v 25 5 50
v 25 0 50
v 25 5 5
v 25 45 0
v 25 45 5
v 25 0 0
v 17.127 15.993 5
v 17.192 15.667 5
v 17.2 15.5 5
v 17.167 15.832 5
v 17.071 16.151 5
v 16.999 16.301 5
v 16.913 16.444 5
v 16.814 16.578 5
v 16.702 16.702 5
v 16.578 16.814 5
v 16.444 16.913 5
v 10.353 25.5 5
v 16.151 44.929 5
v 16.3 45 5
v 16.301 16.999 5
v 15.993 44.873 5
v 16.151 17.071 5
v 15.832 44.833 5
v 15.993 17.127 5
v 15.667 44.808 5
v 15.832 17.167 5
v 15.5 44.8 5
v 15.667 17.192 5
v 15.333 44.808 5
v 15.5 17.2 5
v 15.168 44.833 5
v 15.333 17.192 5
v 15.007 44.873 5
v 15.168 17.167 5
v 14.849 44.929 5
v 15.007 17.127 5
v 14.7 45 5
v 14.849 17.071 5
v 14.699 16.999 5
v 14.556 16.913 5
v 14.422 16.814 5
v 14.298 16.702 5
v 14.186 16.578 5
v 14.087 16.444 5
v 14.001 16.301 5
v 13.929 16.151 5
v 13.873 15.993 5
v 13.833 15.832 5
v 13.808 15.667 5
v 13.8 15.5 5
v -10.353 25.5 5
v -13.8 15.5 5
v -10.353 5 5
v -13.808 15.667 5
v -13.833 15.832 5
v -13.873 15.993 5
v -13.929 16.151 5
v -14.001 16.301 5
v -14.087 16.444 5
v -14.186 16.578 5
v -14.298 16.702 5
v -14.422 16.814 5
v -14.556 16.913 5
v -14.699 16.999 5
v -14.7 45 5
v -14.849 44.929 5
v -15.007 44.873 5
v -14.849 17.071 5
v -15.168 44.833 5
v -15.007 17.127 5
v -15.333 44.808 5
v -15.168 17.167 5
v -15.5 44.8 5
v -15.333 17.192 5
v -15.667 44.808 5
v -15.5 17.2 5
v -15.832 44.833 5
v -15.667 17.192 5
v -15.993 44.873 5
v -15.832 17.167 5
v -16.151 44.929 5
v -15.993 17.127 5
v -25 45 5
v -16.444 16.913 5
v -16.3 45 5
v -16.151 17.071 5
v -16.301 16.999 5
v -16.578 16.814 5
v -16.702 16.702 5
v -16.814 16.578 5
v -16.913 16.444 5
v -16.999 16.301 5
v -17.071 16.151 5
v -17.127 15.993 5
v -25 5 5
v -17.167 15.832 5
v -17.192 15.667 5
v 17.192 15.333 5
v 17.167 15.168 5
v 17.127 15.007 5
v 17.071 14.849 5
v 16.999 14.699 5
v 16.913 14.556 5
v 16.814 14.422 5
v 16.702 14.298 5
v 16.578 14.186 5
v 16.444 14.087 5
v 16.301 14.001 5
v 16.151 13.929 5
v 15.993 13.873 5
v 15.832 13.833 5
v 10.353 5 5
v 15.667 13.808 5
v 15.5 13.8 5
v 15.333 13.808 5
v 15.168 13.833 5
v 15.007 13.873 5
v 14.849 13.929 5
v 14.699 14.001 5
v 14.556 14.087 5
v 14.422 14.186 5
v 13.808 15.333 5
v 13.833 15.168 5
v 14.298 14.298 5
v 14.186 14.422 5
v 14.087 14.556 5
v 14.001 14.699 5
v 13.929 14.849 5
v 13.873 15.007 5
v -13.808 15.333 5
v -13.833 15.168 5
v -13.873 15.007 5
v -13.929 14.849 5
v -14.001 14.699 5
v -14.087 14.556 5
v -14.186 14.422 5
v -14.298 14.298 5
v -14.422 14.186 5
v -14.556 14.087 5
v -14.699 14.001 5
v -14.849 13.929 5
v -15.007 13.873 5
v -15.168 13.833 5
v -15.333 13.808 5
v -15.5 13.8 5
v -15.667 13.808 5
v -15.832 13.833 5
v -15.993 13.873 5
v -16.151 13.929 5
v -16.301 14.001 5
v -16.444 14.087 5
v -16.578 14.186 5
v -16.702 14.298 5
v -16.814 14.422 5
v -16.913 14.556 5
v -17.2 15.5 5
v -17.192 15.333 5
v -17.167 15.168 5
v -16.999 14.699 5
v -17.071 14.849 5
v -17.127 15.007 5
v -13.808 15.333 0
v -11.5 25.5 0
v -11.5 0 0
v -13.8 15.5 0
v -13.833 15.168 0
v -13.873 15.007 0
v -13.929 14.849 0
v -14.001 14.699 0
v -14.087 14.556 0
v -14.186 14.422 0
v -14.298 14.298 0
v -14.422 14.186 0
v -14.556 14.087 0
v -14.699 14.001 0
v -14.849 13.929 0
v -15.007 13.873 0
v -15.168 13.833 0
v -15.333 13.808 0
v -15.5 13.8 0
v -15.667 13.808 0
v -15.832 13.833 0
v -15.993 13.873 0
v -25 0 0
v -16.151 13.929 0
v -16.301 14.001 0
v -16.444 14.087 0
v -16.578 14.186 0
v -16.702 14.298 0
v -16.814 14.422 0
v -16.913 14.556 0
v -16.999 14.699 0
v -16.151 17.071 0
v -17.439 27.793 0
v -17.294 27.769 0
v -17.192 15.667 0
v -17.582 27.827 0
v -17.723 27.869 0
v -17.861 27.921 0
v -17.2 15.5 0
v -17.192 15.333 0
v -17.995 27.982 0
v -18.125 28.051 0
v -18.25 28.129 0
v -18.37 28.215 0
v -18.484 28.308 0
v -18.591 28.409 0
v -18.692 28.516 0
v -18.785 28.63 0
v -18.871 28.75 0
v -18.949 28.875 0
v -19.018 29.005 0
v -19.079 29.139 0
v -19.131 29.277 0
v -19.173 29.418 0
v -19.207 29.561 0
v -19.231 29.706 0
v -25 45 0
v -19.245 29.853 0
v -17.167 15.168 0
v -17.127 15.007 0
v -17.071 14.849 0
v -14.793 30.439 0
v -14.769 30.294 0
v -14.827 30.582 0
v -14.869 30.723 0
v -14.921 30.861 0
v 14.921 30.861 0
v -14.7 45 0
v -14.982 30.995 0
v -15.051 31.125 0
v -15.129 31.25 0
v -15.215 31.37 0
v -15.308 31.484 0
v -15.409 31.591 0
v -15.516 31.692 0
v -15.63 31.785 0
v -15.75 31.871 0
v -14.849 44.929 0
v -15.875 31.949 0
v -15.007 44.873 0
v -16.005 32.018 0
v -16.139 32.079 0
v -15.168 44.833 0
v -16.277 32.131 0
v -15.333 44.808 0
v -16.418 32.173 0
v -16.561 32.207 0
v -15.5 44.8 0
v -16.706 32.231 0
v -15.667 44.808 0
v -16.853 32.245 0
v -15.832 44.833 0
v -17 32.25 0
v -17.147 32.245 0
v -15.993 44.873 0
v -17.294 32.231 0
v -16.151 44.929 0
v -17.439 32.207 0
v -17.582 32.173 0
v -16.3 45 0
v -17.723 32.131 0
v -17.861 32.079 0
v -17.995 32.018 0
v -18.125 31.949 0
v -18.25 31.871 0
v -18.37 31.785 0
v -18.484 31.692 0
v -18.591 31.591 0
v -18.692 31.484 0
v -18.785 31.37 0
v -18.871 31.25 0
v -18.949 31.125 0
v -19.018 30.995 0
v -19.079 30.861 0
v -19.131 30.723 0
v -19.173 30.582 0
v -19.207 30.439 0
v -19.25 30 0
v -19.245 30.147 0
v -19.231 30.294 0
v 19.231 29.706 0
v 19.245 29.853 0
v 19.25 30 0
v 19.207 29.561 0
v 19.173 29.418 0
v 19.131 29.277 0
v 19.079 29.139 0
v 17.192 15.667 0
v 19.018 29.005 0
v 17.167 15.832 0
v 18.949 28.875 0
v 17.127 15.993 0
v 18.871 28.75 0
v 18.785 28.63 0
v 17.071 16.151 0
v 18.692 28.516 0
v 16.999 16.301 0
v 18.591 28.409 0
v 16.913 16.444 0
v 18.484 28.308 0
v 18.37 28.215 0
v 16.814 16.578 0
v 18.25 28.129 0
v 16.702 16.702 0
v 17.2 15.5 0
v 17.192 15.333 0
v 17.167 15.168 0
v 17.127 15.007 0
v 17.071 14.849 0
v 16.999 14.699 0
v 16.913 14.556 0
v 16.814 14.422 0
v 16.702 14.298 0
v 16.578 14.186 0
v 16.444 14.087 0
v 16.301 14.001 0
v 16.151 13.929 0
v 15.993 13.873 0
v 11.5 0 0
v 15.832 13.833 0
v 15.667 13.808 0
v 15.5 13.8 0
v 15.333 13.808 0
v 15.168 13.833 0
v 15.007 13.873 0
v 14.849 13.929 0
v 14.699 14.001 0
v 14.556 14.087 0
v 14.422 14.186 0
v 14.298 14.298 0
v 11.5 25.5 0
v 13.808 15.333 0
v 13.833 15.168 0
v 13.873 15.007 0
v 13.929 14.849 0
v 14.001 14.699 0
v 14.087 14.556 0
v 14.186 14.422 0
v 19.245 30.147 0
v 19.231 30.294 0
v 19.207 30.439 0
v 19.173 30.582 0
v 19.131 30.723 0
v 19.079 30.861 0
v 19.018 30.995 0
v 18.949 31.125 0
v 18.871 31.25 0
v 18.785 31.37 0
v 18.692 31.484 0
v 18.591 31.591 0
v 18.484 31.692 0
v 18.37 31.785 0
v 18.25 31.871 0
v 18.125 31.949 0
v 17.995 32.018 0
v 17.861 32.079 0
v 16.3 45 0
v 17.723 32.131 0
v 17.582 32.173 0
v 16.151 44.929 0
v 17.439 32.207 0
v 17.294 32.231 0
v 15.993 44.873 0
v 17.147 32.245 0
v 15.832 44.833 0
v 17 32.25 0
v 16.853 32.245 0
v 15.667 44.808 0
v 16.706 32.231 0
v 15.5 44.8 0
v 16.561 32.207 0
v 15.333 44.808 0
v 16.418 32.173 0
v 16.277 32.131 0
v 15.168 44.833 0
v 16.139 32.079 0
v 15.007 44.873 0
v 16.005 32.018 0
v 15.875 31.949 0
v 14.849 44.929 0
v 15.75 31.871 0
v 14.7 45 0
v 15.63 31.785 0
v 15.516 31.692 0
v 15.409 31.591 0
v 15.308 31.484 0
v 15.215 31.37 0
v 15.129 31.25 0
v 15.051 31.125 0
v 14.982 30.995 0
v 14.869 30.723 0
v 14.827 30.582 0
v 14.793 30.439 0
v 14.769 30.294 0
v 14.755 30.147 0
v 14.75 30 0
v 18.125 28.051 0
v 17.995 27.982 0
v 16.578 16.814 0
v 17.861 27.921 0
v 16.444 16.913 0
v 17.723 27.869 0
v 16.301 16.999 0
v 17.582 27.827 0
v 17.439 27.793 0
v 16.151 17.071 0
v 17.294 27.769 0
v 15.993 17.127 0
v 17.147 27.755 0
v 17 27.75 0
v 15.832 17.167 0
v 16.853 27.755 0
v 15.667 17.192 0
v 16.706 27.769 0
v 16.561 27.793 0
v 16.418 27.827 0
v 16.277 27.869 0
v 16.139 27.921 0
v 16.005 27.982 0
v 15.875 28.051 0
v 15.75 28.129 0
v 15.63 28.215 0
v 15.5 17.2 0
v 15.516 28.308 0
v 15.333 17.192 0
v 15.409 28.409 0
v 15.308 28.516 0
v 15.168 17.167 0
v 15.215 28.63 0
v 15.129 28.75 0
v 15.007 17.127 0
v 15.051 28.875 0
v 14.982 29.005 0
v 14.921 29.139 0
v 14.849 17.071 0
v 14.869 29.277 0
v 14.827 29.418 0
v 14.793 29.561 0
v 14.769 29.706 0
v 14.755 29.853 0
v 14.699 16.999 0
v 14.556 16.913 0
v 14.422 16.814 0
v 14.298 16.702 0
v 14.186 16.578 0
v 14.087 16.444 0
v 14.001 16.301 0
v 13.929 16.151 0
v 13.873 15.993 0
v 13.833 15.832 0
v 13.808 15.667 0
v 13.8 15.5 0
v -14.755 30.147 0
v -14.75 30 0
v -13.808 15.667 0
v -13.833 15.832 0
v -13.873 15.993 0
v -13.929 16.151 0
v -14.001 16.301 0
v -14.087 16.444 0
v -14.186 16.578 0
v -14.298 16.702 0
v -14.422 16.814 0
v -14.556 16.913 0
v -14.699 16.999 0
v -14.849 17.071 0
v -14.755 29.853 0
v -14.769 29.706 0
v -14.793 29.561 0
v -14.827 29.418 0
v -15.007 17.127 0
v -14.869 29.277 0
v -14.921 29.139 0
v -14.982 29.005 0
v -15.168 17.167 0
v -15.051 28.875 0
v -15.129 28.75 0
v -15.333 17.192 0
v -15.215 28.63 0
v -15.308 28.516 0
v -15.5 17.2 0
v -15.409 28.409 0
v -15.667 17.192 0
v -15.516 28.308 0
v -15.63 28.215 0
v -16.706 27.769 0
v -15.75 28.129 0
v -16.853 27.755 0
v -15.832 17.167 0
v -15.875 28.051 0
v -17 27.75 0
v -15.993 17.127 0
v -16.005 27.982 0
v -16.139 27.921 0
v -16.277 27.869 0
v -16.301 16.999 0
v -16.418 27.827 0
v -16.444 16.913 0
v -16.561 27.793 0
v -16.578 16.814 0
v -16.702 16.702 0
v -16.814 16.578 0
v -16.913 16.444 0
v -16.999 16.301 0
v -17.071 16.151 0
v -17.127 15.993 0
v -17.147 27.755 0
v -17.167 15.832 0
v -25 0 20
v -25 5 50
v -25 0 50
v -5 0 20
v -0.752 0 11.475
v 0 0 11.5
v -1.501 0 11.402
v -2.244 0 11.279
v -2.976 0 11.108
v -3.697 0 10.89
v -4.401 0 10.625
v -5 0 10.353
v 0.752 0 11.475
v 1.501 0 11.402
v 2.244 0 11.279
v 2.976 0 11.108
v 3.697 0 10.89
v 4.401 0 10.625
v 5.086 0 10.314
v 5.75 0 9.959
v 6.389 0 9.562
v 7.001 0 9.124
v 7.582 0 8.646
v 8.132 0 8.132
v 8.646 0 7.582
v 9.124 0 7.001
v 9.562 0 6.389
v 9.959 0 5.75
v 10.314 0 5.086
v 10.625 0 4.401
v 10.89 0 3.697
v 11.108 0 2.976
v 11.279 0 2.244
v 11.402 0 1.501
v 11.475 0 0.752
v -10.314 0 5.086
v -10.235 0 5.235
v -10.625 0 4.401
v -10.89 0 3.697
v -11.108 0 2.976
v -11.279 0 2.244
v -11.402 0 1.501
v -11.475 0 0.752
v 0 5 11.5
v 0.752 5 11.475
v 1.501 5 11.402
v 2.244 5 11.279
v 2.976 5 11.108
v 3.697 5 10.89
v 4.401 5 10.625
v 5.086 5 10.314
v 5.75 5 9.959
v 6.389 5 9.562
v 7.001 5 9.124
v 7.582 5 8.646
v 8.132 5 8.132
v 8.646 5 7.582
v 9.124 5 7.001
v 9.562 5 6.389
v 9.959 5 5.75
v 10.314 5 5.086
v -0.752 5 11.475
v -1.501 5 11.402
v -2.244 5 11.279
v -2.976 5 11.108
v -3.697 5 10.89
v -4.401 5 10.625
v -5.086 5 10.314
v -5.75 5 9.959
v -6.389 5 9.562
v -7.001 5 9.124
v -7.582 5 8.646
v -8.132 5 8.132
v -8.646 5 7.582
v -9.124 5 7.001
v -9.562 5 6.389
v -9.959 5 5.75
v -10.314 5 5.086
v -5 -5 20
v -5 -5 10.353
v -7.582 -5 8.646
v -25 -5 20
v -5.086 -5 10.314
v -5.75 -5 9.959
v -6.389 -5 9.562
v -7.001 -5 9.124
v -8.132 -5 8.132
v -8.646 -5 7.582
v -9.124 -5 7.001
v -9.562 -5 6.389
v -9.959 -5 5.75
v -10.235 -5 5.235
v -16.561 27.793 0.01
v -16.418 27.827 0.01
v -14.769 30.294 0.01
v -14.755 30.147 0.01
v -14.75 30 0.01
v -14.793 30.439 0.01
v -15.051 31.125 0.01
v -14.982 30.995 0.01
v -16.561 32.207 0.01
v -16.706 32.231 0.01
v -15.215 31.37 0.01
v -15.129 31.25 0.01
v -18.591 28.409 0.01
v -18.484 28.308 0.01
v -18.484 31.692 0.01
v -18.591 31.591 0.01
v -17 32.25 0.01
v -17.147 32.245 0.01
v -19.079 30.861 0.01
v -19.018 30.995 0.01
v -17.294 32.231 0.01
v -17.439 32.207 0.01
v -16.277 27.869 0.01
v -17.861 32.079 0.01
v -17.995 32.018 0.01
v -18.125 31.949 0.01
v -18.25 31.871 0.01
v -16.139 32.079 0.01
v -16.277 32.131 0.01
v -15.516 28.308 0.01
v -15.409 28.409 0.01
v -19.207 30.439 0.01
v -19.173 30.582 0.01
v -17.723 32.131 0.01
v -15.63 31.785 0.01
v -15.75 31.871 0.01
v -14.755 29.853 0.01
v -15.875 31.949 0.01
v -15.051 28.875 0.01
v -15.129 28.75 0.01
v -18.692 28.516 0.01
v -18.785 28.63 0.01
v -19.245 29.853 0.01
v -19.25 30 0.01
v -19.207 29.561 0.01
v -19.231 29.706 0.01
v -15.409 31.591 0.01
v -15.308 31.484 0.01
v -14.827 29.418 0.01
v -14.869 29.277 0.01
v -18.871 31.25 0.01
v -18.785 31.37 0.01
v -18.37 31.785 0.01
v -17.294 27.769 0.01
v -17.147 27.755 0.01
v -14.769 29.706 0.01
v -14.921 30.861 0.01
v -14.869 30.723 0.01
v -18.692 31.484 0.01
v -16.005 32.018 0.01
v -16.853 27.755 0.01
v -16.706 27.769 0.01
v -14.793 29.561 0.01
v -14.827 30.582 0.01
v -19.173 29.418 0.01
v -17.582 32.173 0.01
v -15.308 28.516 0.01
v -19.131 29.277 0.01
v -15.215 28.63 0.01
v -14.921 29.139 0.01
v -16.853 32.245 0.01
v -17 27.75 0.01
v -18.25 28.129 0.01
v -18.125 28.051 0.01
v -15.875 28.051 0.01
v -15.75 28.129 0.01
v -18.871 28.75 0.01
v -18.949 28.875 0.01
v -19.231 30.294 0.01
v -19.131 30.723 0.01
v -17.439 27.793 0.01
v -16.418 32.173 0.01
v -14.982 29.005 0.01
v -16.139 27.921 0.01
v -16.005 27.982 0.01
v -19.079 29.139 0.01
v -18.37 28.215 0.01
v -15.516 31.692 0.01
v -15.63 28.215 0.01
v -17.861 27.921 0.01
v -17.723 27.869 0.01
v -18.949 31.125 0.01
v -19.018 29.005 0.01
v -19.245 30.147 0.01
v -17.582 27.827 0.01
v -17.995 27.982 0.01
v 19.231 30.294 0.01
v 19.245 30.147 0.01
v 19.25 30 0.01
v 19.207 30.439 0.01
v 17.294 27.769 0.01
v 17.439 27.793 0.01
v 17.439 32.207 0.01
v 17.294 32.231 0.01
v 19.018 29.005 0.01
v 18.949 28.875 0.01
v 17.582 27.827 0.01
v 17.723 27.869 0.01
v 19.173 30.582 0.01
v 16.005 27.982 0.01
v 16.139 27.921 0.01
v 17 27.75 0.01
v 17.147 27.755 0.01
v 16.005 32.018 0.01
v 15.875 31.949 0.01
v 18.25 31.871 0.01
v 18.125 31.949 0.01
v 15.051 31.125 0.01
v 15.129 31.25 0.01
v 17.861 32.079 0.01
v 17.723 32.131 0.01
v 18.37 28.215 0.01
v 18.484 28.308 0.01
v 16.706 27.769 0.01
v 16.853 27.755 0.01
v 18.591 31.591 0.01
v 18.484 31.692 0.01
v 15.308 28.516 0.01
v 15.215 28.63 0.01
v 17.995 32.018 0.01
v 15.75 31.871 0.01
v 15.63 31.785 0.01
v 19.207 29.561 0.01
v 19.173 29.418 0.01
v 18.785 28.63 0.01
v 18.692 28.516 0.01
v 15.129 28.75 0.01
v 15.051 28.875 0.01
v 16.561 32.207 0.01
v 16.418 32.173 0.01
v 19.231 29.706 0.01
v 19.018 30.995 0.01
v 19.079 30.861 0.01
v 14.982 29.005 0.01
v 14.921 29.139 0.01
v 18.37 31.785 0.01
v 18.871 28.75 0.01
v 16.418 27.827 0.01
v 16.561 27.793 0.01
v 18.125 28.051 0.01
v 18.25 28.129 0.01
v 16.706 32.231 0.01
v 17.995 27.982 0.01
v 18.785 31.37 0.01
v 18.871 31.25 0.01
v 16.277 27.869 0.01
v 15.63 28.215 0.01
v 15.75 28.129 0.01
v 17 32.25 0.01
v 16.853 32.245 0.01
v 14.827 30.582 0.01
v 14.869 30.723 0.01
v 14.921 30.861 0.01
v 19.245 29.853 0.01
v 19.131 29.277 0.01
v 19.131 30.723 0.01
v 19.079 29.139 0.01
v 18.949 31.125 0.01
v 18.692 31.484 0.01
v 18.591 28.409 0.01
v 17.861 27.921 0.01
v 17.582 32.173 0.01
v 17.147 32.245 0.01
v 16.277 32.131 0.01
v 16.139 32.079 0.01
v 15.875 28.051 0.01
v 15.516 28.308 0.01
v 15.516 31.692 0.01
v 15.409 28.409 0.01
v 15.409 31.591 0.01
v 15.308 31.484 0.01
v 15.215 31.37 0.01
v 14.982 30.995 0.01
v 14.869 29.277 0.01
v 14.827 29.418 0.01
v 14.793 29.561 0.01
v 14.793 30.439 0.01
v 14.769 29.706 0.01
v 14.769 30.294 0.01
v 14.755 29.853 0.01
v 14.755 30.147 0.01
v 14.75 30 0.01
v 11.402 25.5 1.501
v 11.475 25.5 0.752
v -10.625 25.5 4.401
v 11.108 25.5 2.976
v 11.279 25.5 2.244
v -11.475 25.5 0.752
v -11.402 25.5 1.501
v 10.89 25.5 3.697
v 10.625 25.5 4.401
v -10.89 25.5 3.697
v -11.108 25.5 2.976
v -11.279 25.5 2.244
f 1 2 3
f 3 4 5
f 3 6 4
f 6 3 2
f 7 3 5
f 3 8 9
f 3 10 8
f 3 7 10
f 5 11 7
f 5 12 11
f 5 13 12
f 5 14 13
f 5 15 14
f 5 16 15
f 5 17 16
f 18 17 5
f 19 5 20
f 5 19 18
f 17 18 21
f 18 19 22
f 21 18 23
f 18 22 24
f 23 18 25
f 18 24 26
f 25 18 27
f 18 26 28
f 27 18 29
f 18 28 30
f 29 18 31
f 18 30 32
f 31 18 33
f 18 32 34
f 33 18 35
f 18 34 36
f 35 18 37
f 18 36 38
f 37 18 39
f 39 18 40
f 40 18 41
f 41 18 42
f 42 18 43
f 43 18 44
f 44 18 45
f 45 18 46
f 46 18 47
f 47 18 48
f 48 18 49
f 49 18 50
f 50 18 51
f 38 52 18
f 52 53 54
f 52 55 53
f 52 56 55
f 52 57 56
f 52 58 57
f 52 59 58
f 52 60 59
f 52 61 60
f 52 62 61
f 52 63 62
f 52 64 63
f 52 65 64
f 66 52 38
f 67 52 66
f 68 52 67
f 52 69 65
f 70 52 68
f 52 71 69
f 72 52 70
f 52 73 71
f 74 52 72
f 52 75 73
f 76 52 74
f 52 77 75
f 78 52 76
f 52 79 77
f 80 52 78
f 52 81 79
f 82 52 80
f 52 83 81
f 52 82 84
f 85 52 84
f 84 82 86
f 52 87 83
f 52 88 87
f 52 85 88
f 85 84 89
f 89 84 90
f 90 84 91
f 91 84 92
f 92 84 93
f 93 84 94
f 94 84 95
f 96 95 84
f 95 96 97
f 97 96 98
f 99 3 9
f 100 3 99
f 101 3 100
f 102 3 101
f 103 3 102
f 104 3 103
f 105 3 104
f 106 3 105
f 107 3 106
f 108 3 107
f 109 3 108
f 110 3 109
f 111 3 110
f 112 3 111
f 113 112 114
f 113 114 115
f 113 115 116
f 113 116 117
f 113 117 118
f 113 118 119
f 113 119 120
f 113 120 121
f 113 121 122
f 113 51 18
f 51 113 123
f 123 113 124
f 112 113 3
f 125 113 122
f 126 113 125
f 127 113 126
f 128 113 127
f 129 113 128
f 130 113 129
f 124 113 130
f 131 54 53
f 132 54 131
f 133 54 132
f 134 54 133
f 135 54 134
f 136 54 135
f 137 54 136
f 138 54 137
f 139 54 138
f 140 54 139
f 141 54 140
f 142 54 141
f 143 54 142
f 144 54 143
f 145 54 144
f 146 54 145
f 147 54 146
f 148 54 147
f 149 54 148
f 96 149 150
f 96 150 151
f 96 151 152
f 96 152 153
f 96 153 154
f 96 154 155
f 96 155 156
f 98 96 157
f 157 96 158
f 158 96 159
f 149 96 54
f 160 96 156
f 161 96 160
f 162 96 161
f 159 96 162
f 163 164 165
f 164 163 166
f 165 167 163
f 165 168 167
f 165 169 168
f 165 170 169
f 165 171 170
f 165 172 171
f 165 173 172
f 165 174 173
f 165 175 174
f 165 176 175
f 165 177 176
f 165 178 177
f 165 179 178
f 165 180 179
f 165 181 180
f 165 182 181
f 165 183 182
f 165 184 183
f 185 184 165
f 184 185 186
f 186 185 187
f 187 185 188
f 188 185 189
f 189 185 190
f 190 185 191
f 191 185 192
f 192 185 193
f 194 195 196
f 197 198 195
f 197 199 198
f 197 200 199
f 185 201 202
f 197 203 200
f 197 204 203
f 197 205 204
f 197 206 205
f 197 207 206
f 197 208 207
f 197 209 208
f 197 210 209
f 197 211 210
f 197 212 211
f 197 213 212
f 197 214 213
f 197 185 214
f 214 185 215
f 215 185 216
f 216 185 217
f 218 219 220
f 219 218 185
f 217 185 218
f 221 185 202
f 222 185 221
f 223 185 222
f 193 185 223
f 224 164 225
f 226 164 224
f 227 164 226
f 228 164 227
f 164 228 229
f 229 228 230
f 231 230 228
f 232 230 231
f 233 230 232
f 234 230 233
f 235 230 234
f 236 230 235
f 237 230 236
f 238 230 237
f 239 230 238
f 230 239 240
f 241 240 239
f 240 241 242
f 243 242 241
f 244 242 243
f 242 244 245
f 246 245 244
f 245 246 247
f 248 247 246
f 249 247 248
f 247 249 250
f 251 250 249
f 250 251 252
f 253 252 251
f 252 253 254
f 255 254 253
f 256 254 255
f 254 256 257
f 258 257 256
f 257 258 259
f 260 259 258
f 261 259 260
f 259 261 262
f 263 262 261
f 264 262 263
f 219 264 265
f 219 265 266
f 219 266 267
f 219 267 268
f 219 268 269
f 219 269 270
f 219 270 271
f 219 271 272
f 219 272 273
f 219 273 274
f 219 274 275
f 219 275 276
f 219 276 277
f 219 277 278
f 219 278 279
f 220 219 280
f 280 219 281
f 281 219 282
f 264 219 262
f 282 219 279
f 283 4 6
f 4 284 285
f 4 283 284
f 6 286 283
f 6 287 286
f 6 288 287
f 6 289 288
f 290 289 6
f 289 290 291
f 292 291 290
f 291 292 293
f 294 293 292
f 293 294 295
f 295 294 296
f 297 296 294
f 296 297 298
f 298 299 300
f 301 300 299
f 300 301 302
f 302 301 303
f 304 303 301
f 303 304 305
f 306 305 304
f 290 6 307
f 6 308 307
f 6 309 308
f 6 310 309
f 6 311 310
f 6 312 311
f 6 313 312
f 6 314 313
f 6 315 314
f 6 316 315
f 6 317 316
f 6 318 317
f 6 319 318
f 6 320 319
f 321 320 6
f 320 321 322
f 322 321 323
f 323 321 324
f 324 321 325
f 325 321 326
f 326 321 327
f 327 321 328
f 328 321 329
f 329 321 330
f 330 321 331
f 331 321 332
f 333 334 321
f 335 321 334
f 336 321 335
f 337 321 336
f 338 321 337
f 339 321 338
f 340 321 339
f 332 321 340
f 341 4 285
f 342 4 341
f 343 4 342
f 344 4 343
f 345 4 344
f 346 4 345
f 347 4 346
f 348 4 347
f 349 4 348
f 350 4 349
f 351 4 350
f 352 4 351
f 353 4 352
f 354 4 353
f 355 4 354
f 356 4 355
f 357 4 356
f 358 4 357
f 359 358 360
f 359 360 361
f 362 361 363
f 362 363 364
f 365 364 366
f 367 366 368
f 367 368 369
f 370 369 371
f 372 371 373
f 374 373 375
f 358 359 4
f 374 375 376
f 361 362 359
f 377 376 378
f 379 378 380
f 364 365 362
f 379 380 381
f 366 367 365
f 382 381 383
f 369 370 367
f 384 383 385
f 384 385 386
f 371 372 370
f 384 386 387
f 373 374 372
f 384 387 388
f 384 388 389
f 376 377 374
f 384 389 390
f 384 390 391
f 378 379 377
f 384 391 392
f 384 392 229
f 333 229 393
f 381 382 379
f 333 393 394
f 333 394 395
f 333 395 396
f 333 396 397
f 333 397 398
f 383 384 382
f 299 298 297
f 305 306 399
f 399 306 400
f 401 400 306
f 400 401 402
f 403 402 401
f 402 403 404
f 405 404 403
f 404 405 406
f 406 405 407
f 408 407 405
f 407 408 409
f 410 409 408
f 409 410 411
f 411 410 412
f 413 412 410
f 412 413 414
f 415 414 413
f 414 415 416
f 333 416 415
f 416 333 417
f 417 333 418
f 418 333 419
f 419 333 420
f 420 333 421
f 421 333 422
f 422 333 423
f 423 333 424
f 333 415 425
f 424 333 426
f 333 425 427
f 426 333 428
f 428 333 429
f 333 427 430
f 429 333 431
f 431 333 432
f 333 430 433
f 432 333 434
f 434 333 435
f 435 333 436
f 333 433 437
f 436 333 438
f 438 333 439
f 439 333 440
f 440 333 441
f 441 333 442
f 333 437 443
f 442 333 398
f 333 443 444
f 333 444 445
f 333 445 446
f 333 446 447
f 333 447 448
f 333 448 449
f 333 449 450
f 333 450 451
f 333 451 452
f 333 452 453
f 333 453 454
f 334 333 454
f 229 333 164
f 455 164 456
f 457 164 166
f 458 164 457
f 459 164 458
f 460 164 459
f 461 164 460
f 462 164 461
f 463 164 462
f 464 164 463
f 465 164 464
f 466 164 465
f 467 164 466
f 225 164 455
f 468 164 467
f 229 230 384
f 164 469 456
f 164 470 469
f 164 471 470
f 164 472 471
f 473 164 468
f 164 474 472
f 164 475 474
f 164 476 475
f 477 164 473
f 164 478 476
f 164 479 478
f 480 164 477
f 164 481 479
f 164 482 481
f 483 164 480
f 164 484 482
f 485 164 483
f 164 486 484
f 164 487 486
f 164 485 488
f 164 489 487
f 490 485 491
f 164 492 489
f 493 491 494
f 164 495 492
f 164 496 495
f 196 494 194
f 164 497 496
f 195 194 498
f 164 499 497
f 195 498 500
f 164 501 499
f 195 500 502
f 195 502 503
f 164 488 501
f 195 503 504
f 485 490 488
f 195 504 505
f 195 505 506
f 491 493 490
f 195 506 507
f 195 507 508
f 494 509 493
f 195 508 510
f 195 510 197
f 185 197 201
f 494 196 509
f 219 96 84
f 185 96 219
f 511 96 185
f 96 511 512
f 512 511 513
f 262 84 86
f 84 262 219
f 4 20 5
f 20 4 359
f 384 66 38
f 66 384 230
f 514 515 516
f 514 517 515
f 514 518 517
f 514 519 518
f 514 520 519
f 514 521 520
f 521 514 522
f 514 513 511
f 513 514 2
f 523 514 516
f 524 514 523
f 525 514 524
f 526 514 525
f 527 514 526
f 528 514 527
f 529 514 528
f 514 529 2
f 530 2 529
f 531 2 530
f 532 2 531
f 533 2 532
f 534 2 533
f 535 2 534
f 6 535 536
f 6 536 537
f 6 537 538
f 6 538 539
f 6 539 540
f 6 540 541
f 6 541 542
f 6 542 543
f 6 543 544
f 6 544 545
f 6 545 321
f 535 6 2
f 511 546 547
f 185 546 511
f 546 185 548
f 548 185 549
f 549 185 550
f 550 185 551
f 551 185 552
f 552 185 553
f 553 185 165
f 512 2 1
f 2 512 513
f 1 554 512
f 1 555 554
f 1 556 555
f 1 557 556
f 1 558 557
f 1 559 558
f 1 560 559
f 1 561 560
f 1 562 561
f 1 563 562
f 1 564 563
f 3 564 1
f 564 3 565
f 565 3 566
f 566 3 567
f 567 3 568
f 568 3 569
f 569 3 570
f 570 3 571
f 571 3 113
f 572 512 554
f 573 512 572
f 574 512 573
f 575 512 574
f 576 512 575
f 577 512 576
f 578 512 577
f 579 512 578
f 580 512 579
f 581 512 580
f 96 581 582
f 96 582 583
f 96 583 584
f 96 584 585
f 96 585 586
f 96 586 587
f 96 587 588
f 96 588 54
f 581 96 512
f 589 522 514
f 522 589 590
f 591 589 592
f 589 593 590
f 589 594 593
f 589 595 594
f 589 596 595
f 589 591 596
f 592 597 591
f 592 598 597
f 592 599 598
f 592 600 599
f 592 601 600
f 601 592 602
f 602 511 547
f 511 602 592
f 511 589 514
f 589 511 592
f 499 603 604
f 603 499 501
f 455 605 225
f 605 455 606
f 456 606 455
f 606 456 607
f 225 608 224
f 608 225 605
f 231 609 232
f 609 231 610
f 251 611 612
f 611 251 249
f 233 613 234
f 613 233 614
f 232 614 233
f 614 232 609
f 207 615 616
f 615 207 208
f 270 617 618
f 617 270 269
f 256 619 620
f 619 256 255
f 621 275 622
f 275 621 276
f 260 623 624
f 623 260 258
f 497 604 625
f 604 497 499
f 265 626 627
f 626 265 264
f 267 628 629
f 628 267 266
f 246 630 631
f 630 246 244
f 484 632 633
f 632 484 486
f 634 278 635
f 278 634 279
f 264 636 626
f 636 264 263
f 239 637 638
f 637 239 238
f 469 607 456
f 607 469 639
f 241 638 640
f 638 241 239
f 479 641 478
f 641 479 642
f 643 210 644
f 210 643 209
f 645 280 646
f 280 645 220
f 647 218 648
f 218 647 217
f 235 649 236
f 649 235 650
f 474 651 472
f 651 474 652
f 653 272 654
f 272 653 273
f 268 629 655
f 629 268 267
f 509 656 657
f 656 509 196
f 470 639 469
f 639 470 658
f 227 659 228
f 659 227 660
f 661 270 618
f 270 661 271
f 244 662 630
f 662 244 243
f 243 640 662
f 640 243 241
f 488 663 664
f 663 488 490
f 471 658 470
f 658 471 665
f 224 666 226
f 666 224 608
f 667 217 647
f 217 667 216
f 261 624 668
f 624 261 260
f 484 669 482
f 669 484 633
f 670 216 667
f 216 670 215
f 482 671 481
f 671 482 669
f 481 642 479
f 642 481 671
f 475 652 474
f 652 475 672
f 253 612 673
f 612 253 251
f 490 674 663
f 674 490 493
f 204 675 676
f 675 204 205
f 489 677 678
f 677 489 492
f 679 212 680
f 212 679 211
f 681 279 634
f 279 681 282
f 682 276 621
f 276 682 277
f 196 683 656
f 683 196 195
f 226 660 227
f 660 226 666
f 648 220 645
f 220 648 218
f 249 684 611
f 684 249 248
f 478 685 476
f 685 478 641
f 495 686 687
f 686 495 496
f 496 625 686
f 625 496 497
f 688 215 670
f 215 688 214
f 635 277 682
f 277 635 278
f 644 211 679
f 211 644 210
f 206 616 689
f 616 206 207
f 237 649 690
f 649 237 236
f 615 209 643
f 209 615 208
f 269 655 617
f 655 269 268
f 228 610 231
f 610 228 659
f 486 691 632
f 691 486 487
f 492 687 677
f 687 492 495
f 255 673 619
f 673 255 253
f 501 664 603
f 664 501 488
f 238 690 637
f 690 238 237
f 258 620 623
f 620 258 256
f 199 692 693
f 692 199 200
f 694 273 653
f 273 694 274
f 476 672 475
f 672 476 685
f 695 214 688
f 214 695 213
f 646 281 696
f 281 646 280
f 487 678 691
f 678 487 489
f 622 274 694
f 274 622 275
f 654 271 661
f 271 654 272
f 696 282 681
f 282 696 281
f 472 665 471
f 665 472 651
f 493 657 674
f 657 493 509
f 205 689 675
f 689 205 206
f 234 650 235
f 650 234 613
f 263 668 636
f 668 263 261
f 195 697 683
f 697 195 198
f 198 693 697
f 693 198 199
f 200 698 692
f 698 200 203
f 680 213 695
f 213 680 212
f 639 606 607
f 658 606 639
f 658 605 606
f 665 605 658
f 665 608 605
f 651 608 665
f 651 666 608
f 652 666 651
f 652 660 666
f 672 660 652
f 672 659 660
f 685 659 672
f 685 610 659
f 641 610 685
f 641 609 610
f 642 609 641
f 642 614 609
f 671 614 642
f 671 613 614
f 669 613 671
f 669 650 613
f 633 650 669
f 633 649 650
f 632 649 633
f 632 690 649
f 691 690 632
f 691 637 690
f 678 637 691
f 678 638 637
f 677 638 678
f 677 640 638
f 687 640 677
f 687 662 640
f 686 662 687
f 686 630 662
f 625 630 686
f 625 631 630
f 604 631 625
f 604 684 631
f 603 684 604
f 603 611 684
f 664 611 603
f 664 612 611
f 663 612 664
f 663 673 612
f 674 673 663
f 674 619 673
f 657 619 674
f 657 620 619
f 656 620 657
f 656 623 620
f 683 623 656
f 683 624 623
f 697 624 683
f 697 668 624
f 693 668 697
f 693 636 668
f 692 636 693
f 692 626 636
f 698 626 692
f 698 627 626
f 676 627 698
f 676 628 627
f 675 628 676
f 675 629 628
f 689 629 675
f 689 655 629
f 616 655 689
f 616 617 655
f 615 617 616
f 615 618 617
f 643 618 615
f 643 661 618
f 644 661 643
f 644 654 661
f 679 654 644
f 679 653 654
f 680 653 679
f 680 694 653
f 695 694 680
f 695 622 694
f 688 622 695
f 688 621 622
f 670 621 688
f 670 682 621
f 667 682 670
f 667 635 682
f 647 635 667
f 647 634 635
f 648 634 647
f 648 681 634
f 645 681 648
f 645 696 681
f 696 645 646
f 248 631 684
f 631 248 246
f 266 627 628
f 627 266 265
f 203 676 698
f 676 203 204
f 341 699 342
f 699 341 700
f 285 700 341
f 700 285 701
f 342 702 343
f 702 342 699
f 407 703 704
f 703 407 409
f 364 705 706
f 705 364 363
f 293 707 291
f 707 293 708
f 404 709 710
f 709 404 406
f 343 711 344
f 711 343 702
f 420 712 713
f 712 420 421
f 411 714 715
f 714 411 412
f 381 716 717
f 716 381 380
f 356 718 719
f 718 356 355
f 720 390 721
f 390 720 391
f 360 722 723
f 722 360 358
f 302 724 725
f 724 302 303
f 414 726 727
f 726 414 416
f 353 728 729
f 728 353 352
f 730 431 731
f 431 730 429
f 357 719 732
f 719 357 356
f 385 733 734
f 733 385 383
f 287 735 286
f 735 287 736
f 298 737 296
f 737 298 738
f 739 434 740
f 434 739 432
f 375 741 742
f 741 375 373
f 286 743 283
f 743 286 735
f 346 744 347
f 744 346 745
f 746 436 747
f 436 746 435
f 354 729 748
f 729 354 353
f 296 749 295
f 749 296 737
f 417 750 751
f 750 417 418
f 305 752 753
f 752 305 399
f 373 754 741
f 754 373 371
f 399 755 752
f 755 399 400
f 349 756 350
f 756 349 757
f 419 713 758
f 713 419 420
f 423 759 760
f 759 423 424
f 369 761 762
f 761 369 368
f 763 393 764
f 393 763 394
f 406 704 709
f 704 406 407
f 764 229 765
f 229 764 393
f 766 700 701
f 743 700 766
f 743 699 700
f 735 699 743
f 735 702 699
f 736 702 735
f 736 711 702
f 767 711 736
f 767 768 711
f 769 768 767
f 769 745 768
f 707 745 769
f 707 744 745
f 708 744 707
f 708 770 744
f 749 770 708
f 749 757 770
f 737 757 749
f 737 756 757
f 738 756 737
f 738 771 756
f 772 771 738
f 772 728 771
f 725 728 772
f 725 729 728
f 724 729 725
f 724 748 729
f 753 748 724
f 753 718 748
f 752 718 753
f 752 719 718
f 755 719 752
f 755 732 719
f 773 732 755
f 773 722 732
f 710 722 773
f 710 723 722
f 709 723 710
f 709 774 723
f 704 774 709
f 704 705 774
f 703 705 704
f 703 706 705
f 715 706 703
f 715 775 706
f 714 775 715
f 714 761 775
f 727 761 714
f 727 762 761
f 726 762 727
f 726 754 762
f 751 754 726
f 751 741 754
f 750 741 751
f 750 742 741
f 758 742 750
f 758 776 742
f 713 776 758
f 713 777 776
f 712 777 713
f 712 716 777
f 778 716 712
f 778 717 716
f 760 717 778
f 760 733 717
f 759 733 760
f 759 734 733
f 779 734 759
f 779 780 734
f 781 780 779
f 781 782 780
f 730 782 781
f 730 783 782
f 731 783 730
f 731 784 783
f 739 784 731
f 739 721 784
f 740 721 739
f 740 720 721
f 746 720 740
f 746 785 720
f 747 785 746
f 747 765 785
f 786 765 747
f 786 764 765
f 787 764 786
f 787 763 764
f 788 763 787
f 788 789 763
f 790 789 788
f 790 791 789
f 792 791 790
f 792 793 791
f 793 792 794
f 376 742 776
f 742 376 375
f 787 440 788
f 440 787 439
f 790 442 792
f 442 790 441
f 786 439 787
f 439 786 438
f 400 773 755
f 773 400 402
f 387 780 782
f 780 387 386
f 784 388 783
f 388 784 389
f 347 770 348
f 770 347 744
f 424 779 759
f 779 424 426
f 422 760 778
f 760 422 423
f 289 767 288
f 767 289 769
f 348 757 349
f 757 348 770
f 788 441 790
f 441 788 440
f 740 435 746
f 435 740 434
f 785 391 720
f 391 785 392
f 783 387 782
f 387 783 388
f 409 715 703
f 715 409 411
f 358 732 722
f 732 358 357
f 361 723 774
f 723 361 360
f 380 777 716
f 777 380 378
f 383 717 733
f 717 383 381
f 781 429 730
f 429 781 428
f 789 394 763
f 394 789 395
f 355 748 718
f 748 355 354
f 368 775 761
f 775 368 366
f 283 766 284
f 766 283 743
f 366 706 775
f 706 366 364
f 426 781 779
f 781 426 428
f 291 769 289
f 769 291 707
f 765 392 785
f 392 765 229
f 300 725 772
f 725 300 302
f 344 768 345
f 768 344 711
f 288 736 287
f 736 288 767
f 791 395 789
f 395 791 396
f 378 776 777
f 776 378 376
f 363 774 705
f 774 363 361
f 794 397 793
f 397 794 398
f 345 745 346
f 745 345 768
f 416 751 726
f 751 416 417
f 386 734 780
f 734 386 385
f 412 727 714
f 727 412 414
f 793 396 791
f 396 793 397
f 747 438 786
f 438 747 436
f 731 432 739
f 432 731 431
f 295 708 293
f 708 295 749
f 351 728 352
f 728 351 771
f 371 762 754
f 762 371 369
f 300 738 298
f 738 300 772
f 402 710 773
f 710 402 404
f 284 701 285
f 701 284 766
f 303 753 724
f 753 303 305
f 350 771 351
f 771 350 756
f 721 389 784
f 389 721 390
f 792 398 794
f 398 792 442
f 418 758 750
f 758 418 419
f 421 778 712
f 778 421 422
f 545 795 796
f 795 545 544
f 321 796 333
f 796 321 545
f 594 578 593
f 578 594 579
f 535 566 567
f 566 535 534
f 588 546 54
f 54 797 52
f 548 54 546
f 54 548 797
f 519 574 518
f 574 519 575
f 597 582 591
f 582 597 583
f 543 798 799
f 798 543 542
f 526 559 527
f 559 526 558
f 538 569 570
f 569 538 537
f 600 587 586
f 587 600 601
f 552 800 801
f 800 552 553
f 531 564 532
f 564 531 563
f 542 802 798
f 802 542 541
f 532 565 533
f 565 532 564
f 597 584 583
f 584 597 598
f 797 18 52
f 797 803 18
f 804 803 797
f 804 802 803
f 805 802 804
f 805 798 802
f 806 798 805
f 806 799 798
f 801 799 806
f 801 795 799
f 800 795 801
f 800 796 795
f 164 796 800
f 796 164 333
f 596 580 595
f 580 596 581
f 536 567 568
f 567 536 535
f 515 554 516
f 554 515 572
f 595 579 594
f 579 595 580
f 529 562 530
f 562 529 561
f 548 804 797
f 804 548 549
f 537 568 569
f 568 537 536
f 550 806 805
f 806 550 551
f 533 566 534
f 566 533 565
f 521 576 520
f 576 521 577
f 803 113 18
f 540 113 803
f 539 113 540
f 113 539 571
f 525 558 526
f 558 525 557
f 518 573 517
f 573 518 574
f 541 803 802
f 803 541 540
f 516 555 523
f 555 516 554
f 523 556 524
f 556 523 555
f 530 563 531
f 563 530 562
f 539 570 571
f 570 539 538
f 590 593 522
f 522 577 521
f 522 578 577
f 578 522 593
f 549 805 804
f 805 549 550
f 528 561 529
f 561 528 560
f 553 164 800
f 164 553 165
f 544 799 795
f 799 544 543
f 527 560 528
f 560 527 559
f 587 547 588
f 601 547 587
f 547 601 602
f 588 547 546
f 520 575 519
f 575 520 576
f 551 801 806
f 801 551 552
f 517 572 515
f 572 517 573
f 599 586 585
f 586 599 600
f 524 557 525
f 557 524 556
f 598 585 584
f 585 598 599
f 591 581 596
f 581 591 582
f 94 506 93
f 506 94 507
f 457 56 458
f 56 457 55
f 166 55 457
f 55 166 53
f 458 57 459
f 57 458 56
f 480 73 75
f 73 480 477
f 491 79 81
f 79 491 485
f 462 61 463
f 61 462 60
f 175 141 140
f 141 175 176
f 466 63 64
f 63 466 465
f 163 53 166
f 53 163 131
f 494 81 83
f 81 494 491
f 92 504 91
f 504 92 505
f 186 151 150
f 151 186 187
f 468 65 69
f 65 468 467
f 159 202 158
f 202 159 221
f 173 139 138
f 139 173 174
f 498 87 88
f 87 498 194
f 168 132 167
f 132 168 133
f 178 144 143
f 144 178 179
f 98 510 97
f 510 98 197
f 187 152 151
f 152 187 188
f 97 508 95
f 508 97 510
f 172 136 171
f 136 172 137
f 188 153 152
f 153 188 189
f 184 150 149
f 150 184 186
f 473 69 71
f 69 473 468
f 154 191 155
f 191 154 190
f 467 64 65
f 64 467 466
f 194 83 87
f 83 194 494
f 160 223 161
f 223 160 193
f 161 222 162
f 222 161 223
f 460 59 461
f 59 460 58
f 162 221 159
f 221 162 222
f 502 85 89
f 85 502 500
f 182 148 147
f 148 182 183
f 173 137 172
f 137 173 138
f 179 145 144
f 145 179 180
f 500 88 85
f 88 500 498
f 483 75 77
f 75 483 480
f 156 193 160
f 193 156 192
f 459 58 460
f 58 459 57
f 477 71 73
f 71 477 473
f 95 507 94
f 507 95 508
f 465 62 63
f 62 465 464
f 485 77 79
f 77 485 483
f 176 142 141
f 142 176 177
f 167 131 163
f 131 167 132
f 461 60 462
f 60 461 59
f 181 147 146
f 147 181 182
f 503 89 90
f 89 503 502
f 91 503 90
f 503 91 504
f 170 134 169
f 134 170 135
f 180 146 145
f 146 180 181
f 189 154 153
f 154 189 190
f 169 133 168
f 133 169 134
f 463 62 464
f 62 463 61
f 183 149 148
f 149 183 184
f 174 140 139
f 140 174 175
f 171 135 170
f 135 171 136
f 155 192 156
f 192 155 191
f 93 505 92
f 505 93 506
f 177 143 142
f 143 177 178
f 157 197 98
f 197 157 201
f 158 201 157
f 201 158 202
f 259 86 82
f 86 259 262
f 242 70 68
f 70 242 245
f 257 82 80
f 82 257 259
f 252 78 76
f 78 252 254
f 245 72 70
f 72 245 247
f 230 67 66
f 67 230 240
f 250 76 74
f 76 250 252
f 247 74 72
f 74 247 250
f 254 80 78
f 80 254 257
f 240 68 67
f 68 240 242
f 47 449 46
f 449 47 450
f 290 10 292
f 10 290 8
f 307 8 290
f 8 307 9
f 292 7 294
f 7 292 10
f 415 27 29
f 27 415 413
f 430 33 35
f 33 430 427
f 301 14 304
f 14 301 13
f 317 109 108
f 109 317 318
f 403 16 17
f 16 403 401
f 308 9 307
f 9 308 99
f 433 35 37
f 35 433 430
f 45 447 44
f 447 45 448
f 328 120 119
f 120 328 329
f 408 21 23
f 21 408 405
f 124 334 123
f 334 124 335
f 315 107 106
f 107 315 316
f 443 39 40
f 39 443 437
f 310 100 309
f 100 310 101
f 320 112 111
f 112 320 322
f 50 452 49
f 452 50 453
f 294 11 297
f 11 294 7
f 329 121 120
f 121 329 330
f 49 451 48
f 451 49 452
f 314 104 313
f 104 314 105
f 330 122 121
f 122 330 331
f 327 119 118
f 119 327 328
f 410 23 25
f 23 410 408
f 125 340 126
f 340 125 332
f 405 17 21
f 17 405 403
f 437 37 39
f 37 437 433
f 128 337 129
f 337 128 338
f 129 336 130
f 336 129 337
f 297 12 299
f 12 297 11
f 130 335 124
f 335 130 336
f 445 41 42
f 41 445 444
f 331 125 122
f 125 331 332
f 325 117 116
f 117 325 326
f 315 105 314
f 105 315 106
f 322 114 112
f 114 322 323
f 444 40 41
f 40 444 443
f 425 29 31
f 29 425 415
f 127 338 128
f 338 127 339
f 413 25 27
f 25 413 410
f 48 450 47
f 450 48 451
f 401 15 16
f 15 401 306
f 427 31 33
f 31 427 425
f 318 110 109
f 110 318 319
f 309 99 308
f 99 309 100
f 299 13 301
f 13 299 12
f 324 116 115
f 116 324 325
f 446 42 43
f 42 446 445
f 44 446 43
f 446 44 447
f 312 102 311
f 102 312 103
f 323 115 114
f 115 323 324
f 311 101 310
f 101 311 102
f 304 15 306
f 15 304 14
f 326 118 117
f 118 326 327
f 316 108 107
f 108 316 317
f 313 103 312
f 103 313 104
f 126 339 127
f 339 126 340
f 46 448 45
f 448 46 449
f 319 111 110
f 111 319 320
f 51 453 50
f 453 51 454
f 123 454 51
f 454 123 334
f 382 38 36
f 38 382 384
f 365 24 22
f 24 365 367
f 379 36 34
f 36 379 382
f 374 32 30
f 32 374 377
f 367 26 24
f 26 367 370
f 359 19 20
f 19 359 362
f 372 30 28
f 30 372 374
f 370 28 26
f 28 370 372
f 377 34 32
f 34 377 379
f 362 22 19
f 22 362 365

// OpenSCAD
// L-shaped mounting bracket for NEMA 17 stepper motor
// Print orientation: base plate on bed (z = 0), vertical plate upward (+Z)

// ---------------- Parameters ----------------
base_x0      = -25;   // base plate X start
base_x1      = 25;    // base plate X end
base_y0      = 0;     // base plate Y start
base_y1      = 45;    // base plate Y end
base_z       = 5;     // base plate thickness

motor_h      = 50;    // vertical motor plate height
motor_y0     = 0;     // motor plate Y start (flush with base edge)
motor_y1     = 5;     // motor plate Y end (thickness)

boss_d       = 23;    // motor centring boss hole diameter
boss_x       = 0;     // boss hole X centre
boss_z       = 28;    // boss hole Z centre

screw_d      = 3.4;   // M3 screw hole diameter
screw_n      = 4;     // number of screw holes
screw_p      = 31;    // square pattern pitch (side length)

gusset_t     = 5;     // gusset thickness (along X)
gusset_leg   = 20;    // right-triangle leg length (along Y and Z)
gusset_x0    = -25;   // left gusset X start
gusset_x1    = -20;   // left gusset X end
// right gusset runs from x = 20 to x = 25 (flush with right edge)

eps          = 0.5;   // cutter overshoot past faces

$fn = 96;

// ---------------- Model ----------------
difference() {
    union() {
        // Base plate
        translate([base_x0, base_y0, 0])
            cube([base_x1 - base_x0, base_y1 - base_y0, base_z]);

        // Vertical motor plate
        translate([base_x0, motor_y0, 0])
            cube([base_x1 - base_x0, motor_y1 - motor_y0, motor_h]);

        // Gussets (right-triangle in YZ plane, extruded along X)
        for (sx = [-1, 1]) {
            x0 = sx == -1 ? gusset_x0 : gusset_x1;
            x1 = sx == -1 ? gusset_x1 : gusset_x0;
            translate([x0, 0, 0])
                rotate([90, 0, 0])
                    linear_extrude(height = x1 - x0)
                        polygon(points = [
                            [gusset_leg, gusset_leg],  // right-angle corner at y = 5, z = 5
                            [gusset_leg, 0],
                            [0, gusset_leg]
                        ]);
        }
    }

    // Base plate through-holes (M4)
    for (h = [base_z + eps, -eps]) {
        translate([-17, 30, h])
            cylinder(d = 4.5, h = abs(h) + 0.01);
        translate([17, 30, h])
            cylinder(d = 4.5, h = abs(h) + 0.01);
    }

    // Motor boss hole (along Y) and screw holes on square pattern
    {
        translate([0, 0, 0])
            rotate([90, 0, 0]) {
                difference() {
                    cylinder(d = boss_d, h = motor_h + 2 * eps, center = true);
                    translate([0, -eps, boss_z])
                        cylinder(d = boss_d + 2 * eps, h = motor_h + 2 * eps);
                }
            }
        for (i = [0 : screw_n - 1]) {
            for (j = [0 : screw_n - 1]) {
                translate([(i - (screw_n - 1) / 2) * screw_p,
                           (j - (screw_n - 1) / 2) * screw_p,
                           -eps])
                    cylinder(d = screw_d, h = motor_h + 2 * eps, $fn = 64);
            }
        }
    }
}
